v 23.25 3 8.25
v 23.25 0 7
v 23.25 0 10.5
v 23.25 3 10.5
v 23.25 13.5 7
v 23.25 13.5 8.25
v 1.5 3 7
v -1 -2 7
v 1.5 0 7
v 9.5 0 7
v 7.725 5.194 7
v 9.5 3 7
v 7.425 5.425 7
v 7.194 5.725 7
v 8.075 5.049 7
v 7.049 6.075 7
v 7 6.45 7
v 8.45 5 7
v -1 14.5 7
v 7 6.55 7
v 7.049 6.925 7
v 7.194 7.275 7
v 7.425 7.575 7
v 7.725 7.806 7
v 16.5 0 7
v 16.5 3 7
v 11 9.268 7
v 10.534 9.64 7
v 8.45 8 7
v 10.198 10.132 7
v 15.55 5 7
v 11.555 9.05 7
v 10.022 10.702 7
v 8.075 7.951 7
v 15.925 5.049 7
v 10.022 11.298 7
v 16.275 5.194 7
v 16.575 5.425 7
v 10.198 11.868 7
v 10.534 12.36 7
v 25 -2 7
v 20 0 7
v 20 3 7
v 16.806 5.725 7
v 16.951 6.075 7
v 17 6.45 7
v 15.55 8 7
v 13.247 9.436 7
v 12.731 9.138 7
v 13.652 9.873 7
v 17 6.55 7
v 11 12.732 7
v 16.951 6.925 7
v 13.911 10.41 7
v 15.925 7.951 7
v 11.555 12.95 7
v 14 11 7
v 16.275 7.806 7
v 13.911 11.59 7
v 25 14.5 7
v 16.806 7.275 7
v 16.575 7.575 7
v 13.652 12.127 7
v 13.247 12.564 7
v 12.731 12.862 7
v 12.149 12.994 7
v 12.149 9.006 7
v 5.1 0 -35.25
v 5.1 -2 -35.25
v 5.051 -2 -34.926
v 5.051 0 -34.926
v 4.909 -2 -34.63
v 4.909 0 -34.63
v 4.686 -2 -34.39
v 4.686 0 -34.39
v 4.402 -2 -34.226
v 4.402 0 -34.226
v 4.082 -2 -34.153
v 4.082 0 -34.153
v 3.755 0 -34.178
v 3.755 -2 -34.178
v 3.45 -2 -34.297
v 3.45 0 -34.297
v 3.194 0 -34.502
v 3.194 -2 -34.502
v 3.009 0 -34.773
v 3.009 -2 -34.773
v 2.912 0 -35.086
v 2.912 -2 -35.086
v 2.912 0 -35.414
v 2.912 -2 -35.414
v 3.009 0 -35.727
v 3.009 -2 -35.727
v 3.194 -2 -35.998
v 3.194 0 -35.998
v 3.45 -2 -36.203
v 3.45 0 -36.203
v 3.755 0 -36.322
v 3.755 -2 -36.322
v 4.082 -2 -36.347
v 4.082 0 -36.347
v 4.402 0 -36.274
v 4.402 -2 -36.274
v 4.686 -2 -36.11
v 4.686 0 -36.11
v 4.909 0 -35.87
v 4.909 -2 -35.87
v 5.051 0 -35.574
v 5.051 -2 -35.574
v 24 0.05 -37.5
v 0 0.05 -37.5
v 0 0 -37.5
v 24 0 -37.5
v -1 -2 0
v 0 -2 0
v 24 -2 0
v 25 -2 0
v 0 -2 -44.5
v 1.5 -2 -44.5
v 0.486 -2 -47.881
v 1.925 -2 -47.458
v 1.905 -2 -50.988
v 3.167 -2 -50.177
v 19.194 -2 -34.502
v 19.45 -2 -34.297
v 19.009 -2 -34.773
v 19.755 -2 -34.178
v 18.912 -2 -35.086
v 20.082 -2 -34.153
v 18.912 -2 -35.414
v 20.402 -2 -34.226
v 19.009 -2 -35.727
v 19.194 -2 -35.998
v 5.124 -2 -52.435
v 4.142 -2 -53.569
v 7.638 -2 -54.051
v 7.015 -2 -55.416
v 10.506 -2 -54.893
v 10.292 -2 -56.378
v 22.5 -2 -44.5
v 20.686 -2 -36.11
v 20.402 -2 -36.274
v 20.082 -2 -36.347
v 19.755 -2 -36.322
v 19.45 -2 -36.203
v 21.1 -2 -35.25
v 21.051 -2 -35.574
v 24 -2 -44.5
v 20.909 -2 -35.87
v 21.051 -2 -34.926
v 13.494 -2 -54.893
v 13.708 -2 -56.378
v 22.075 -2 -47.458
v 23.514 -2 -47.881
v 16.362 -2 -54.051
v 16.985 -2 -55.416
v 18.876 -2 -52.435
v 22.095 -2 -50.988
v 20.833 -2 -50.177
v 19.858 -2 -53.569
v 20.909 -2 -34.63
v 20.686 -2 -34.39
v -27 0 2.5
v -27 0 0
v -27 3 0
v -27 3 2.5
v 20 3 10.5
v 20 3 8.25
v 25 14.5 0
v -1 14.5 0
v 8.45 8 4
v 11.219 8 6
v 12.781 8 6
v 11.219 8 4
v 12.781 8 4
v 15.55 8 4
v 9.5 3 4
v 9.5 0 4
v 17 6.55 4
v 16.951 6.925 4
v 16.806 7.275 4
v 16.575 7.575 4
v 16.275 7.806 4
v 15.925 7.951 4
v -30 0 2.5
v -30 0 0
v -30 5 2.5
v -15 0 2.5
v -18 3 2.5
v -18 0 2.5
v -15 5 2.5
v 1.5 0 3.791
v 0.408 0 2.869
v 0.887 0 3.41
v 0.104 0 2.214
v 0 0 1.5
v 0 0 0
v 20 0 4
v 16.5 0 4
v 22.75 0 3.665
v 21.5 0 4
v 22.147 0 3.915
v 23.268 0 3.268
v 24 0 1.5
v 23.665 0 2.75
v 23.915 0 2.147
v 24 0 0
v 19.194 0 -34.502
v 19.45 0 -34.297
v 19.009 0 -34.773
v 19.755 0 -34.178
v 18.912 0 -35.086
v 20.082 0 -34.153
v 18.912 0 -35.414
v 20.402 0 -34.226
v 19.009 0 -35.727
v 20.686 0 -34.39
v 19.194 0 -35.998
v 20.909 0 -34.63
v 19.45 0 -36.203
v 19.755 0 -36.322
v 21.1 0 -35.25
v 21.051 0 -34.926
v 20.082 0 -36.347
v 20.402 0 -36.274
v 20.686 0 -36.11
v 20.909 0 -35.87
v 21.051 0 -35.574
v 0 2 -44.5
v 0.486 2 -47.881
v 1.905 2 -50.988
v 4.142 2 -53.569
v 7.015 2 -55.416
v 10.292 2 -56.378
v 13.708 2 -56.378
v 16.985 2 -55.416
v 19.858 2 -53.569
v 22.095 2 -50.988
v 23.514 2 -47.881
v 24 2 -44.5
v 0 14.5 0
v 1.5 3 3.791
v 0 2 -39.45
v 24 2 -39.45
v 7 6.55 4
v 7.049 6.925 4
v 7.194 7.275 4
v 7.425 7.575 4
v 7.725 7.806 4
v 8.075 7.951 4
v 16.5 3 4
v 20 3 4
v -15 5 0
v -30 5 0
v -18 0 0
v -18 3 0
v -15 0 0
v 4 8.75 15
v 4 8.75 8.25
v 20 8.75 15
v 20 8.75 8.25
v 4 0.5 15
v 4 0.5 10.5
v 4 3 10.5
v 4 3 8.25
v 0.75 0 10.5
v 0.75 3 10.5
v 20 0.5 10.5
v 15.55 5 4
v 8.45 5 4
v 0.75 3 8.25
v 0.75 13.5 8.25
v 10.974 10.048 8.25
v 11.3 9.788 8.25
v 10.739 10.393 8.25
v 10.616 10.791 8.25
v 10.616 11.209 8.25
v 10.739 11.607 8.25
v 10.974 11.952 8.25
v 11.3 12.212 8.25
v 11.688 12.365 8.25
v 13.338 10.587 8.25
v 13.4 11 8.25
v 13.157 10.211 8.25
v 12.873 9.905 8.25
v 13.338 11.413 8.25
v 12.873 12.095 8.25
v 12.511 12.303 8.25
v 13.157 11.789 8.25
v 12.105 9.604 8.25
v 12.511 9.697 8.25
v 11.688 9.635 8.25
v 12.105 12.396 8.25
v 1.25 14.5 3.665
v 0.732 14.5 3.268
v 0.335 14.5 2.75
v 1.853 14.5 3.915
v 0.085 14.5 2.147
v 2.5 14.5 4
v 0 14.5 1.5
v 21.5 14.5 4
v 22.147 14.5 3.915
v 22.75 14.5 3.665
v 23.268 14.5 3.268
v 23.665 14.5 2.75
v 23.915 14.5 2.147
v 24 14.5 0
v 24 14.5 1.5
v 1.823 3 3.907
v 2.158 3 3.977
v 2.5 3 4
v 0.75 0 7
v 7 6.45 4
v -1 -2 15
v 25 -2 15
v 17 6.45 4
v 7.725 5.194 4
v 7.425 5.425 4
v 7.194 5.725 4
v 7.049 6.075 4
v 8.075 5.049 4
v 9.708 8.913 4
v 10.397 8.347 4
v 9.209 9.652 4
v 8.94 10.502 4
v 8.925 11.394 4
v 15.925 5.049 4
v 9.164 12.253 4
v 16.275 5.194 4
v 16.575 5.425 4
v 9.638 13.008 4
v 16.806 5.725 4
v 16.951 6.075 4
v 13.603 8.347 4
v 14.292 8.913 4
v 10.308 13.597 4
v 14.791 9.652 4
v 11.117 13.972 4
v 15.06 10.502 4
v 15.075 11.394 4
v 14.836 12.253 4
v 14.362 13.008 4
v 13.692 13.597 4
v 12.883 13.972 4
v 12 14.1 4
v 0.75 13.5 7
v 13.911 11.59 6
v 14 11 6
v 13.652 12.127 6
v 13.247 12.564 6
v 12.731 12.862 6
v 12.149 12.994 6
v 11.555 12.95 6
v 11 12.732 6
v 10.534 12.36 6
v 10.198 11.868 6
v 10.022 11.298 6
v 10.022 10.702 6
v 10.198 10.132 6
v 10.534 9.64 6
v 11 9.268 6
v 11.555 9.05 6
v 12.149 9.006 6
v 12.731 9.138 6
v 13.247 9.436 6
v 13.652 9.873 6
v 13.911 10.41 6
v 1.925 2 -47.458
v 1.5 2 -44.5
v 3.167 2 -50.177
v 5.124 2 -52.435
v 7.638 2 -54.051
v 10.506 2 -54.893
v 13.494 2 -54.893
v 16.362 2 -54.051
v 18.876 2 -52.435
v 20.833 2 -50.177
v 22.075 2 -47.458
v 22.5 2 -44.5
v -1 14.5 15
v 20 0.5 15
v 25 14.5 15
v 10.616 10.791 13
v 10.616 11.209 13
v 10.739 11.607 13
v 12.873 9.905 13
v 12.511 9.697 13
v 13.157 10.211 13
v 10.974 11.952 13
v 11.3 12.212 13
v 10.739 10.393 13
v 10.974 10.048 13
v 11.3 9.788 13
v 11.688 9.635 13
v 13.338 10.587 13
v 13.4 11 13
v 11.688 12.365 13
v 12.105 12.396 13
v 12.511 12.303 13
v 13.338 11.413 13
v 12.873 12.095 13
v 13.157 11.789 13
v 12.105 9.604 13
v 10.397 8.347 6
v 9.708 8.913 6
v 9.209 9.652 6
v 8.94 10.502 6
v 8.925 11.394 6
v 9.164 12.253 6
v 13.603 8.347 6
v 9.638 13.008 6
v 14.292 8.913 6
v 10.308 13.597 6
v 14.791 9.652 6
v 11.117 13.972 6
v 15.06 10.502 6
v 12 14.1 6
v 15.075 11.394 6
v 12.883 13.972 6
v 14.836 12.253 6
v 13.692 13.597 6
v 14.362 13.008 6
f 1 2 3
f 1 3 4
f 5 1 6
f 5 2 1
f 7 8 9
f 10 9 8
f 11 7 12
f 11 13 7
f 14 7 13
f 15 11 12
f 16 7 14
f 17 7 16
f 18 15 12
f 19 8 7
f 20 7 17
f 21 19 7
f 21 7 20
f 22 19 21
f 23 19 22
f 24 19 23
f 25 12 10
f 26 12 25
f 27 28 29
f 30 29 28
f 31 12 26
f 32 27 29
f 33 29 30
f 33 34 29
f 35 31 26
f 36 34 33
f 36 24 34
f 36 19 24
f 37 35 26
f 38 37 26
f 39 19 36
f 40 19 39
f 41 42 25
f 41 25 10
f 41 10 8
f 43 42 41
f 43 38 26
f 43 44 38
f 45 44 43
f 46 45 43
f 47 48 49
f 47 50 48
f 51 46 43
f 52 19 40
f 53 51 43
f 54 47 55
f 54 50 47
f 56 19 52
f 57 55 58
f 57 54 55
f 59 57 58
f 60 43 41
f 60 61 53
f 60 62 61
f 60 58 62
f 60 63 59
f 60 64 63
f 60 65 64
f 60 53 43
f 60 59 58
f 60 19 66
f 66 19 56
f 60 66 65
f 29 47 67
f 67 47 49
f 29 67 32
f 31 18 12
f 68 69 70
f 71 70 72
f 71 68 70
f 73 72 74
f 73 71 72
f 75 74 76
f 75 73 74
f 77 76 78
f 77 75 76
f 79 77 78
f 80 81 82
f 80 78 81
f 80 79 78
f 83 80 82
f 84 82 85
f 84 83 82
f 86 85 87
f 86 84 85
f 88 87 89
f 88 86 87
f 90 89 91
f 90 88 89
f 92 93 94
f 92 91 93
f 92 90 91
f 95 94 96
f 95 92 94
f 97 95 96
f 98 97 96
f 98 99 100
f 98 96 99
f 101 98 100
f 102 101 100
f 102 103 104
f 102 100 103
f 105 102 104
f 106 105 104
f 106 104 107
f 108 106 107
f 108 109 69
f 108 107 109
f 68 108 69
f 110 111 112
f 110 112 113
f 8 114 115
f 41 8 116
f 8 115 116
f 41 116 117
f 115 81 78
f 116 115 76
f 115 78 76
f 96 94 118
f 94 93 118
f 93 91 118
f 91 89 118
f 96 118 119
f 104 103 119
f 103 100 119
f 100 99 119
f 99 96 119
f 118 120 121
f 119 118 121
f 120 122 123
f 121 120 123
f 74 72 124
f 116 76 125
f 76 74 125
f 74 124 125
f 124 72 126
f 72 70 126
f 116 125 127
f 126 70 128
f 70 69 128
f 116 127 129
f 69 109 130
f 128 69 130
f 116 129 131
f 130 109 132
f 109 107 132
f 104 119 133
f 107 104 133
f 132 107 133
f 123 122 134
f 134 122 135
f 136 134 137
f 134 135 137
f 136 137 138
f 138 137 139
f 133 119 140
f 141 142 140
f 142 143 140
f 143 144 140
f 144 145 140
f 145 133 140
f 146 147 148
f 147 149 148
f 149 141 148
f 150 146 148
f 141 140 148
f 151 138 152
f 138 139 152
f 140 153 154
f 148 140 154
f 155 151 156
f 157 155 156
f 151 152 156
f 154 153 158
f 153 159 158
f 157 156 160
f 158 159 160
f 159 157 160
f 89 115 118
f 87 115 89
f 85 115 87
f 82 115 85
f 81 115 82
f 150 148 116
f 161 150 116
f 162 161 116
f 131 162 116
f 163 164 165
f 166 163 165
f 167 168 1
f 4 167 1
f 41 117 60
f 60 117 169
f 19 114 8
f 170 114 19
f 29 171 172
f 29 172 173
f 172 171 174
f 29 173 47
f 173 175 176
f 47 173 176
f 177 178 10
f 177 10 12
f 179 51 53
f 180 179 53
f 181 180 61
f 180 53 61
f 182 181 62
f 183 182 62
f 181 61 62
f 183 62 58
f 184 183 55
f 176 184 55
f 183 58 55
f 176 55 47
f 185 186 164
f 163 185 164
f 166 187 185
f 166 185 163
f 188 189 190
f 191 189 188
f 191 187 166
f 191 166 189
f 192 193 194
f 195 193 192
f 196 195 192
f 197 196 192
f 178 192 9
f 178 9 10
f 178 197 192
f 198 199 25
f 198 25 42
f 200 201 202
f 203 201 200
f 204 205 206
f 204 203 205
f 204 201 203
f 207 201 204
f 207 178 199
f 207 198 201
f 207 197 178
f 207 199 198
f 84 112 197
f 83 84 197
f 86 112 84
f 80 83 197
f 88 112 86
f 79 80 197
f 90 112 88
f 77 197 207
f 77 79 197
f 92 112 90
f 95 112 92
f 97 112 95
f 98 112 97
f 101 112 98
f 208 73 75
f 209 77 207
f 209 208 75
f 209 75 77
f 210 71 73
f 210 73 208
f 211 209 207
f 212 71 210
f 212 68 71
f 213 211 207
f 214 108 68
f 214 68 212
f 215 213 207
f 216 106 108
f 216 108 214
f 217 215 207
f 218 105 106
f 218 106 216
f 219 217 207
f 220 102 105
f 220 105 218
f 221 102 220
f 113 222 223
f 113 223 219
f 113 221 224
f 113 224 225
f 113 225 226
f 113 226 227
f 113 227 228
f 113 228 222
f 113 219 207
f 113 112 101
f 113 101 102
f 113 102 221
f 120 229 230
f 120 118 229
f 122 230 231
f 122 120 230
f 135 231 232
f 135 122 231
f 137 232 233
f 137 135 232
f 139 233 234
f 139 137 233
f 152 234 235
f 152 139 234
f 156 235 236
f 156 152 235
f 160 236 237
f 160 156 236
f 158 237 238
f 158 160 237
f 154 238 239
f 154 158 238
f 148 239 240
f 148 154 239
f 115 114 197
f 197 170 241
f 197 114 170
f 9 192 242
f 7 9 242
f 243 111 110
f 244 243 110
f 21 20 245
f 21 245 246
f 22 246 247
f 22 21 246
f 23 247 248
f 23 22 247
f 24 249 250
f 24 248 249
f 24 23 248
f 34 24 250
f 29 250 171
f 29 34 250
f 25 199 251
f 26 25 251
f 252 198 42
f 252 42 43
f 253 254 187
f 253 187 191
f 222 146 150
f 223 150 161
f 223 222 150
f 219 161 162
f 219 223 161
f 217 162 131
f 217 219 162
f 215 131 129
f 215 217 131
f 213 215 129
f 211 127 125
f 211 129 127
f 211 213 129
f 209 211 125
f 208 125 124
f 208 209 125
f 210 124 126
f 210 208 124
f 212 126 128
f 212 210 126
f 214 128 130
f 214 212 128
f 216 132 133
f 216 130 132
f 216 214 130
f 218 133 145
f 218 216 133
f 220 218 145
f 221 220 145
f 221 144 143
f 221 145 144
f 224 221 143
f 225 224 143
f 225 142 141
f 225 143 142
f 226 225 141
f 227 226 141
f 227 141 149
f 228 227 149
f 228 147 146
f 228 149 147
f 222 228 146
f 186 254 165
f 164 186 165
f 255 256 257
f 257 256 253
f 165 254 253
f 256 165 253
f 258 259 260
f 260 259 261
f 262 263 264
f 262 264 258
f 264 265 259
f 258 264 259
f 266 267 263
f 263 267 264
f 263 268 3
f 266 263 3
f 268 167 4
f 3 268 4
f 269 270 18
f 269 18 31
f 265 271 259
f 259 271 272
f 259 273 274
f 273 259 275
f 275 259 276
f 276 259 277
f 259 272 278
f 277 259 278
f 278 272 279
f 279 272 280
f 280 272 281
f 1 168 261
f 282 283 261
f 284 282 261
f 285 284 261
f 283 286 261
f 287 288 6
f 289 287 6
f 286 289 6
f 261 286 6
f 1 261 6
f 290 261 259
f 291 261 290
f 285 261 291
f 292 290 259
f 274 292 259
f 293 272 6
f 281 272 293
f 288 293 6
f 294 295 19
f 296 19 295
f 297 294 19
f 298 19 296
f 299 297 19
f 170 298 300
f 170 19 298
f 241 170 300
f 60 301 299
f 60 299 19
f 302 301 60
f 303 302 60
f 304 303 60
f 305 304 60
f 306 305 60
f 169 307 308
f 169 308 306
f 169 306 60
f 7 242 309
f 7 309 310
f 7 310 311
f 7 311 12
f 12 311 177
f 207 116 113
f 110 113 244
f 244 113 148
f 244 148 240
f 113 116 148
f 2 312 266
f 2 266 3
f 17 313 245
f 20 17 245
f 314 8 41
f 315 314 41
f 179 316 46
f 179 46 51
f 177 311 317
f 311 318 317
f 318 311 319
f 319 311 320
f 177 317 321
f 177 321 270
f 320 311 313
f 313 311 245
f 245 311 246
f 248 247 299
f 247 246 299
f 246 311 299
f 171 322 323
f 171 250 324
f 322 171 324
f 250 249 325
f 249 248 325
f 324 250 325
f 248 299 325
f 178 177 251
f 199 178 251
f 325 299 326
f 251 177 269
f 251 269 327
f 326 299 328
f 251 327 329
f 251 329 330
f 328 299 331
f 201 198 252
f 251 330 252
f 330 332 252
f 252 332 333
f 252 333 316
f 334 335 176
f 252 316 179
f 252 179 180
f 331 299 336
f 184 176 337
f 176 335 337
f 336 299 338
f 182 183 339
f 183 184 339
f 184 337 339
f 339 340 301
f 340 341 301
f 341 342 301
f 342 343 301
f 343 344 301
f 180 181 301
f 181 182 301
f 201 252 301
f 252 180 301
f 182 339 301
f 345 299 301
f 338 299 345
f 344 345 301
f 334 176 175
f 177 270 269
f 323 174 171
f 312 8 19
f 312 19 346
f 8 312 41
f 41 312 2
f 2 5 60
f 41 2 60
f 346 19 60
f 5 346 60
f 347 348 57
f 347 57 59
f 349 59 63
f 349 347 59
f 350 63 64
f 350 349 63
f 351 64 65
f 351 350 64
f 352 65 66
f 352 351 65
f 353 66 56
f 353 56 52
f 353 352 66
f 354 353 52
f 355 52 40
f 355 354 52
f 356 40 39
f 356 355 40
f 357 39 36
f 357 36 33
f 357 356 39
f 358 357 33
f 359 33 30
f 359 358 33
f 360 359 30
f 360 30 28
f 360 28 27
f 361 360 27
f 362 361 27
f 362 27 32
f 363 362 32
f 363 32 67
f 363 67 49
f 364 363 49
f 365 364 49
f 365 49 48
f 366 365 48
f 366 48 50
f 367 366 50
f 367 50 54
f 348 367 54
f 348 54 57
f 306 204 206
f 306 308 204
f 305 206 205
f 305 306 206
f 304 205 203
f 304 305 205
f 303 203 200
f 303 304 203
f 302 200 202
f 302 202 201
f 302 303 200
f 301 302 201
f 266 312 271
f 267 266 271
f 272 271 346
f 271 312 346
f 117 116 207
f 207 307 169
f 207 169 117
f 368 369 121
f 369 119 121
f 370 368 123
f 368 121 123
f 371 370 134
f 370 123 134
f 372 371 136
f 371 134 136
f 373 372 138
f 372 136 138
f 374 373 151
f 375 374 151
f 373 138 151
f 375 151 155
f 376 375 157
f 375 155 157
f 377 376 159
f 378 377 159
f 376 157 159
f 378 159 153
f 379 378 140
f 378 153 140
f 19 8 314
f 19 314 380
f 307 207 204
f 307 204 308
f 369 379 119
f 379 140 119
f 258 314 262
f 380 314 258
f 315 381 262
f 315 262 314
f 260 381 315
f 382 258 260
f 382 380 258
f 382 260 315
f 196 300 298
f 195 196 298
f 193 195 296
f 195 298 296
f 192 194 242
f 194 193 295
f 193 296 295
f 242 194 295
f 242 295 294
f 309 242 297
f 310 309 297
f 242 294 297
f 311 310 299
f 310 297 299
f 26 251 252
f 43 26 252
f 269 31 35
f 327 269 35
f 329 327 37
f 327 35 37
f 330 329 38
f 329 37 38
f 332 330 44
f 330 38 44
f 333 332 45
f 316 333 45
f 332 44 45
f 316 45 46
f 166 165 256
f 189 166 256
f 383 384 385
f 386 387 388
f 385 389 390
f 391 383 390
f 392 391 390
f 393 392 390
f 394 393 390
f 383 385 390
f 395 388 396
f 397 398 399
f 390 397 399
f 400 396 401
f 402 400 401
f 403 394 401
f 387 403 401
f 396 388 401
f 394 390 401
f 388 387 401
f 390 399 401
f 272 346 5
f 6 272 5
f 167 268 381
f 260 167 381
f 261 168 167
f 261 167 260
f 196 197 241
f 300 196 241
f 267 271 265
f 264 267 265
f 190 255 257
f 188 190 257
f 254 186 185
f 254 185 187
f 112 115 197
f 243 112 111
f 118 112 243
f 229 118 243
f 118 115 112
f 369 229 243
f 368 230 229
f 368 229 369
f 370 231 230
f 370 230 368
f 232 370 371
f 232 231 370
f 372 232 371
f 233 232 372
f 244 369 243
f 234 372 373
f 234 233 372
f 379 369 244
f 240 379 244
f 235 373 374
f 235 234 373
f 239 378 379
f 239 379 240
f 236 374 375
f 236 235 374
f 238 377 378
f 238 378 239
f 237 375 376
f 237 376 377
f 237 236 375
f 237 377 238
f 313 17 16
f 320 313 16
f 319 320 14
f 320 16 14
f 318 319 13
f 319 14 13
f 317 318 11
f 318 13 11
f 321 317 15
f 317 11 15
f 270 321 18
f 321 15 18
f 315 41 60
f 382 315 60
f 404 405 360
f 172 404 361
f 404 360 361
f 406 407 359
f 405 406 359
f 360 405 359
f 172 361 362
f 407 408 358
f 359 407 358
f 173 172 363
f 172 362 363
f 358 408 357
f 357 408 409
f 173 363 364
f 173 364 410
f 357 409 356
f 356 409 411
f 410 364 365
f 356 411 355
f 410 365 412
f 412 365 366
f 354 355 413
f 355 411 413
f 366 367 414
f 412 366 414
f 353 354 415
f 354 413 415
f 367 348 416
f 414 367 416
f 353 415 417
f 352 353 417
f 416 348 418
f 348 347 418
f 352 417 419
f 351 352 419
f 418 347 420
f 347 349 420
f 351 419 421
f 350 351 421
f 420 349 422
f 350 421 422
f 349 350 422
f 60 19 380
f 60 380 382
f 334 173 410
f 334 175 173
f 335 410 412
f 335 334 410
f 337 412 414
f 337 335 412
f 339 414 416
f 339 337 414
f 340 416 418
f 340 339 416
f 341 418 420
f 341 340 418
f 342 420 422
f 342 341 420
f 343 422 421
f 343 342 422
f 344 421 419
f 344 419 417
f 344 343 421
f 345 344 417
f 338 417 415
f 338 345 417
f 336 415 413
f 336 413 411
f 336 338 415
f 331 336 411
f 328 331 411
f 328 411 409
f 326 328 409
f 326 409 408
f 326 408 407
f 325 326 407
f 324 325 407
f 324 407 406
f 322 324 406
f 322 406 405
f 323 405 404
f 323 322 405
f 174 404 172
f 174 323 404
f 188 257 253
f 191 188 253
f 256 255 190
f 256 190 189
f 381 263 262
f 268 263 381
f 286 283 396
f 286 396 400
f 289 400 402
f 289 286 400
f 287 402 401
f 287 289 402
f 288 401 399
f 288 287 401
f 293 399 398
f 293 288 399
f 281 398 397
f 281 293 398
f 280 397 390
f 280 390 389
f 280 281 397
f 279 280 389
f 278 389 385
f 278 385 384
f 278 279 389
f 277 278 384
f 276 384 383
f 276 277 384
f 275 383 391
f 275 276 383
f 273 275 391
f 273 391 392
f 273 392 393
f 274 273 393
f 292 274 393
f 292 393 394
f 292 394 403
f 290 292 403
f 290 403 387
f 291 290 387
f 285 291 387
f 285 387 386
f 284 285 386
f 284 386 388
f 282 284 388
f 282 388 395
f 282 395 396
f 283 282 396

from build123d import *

# Parameters (mm, degrees)
BOX014_W          = 9
BOX014_H          = 3
BOX014_DEPTH      = 2.5
BOX013_W          = 15
BOX013_H          = 5
BOX013_DEPTH      = 2.5
CYLINDER001_R     = 1.1
CYLINDER001_DEPTH = 10
CYLINDER002_R     = 1.1
CYLINDER002_DEPTH = 10
BOX007_W          = 24
BOX007_H          = 2
BOX007_DEPTH      = 43.5
CYLINDER009_W     = 10.5
CYLINDER009_H     = 4
CYLINDER009_ANGLE = 180
CYLINDER008_W     = 12
CYLINDER008_H     = 4
CYLINDER008_ANGLE = 180
BOX011_W          = 24
BOX011_H          = 4
BOX011_DEPTH      = 7
CYLINDER006_R     = 2
CYLINDER006_DEPTH = 2
CYLINDER005_R     = 3.1
CYLINDER005_DEPTH = 2
BOX002_W          = 8
BOX002_H          = 3
BOX002_DEPTH      = 7
BOX003_W          = 10
BOX003_H          = 3
BOX003_DEPTH      = 7
FILLET001_R       = 1.45
BOX015_W          = 3.5
BOX015_H          = 3
BOX015_DEPTH      = 7
BOX_W             = 24
BOX_H             = 14.5
BOX_DEPTH         = 4
FILLET_R          = 2.5
BOX001_W          = 26
BOX001_H          = 16.5
BOX001_DEPTH      = 7
CHAMFER_SIZE      = 1.95
BOX012_W          = 22.5
BOX012_H          = 10.5
BOX012_DEPTH      = 1.25
BOX017_W          = 16
BOX017_H          = 8.25
BOX017_DEPTH      = 10
BOX004_W          = 22.5
BOX004_H          = 3
BOX004_DEPTH      = 3.5
CYLINDER007_R     = 1.4
CYLINDER007_DEPTH = 6
BOX005_W          = 26
BOX005_H          = 16.5
BOX005_DEPTH      = 8


with BuildPart() as cube_dht22_support_inner:
    # Box014 → Box014 (new body)
    with BuildSketch(Plane(origin=(-27, 0, 0), x_dir=(1, 0, 0), z_dir=(0, 0, 1))):
        with Locations((4.5, 1.5)):
            Rectangle(BOX014_W, BOX014_H)
    extrude(amount=BOX014_DEPTH)


with BuildPart() as cut007_dht22_support:
    # Box013 → Box013 (new body)
    with BuildSketch(Plane(origin=(-30, 0, 0), x_dir=(1, 0, 0), z_dir=(0, 0, 1))):
        with Locations((7.5, 2.5)):
            Rectangle(BOX013_W, BOX013_H)
    extrude(amount=BOX013_DEPTH)

    # Cut007: cut Cube(dht22_support_inner)
    add(cube_dht22_support_inner.part, mode=Mode.SUBTRACT)


with BuildPart() as cylinder001_right_bolt_clear:
    # Cylinder001 → Cylinder001 (new body)
    with BuildSketch(Plane(origin=(4, 0, -35.25), x_dir=(1, 0, 0), z_dir=(0, -1, 0))):
        Circle(CYLINDER001_R)
    extrude(amount=CYLINDER001_DEPTH)


with BuildPart() as fusion004:
    # Cylinder002 → Cylinder002 (new body)
    with BuildSketch(Plane(origin=(20, 0, -35.25), x_dir=(1, 0, 0), z_dir=(0, -1, 0))):
        Circle(CYLINDER002_R)
    extrude(amount=CYLINDER002_DEPTH)

    # Fusion004: union Cylinder001(right_bolt_clear)
    add(cylinder001_right_bolt_clear.part)


with BuildPart() as cut005:
    # Box007 → Box007 (new body)
    with BuildSketch(Plane(origin=(0, -2, -37.5), x_dir=(1, 0, 0), z_dir=(0, 0, 1))):
        with Locations((12, 1)):
            Rectangle(BOX007_W, BOX007_H)
    extrude(amount=BOX007_DEPTH)

    # Cut005: cut Fusion004
    add(fusion004.part, mode=Mode.SUBTRACT)


with BuildPart() as cylinder008_inner_hook:
    # Cylinder009 → Cylinder009 (revolve)
    with BuildSketch(Plane(origin=(12, 2, -44.5), x_dir=(-1, 0, 0), z_dir=(0, 0, 1))):
        with Locations((5.25, 2)):
            Rectangle(CYLINDER009_W, CYLINDER009_H)
    revolve(axis=Axis((12, 2, -44.5), (0, -1, 0)), revolution_arc=CYLINDER009_ANGLE)


with BuildPart() as cylinder008_outer_hook:
    # Cylinder008 → Cylinder008 (revolve)
    with BuildSketch(Plane(origin=(12, 2, -44.5), x_dir=(-1, 0, 0), z_dir=(0, 0, 1))):
        with Locations((6, 2)):
            Rectangle(CYLINDER008_W, CYLINDER008_H)
    revolve(axis=Axis((12, 2, -44.5), (0, -1, 0)), revolution_arc=CYLINDER008_ANGLE)


with BuildPart() as cut004:
    # Box011 → Box011 (new body)
    with BuildSketch(Plane(origin=(0, -2, -44.5), x_dir=(1, 0, 0), z_dir=(0, 0, 1))):
        with Locations((12, 2)):
            Rectangle(BOX011_W, BOX011_H)
    extrude(amount=BOX011_DEPTH)

    # Fusion008: union Cylinder008(outer_hook)
    add(cylinder008_outer_hook.part)

    # Cut004: cut Cylinder008(inner_hook)
    add(cylinder008_inner_hook.part, mode=Mode.SUBTRACT)


with BuildPart() as cylinder005_bolt_clear:
    # Cylinder006 → Cylinder006 (new body)
    with BuildSketch(Plane(origin=(12, 11, 5), x_dir=(1, 0, 0), z_dir=(0, 0, 1))):
        Circle(CYLINDER006_R)
    extrude(amount=CYLINDER006_DEPTH)


with BuildPart() as cylinder005_bolt_head:
    # Cylinder005 → Cylinder005 (new body)
    with BuildSketch(Plane(origin=(12, 11, 4), x_dir=(1, 0, 0), z_dir=(0, 0, 1))):
        Circle(CYLINDER005_R)
    extrude(amount=CYLINDER005_DEPTH)


with BuildPart() as cube_header_cutter_big:
    # Box002 → Box002 (new body)
    with BuildSketch(Plane(origin=(1.5, 0, 0), x_dir=(1, 0, 0), z_dir=(0, 0, 1))):
        with Locations((4, 1.5)):
            Rectangle(BOX002_W, BOX002_H)
    extrude(amount=BOX002_DEPTH)


with BuildPart() as fillet001:
    # Box003 → Box003 (new body)
    with BuildSketch(Plane(origin=(7, 5, 0), x_dir=(1, 0, 0), z_dir=(0, 0, 1))):
        with Locations((5, 1.5)):
            Rectangle(BOX003_W, BOX003_H)
    extrude(amount=BOX003_DEPTH)

    # Fillet001
    fillet001_edges = [fillet001.edges().sort_by_distance(p)[0] for p in [
        (7, 5, 3.5),
        (7, 8, 3.5),
        (17, 5, 3.5),
        (17, 8, 3.5),
    ]]
    fillet(fillet001_edges, radius=FILLET001_R)


with BuildPart() as fusion:
    # Box015 → Box015 (new body)
    with BuildSketch(Plane(origin=(16.5, 0, 0), x_dir=(1, 0, 0), z_dir=(0, 0, 1))):
        with Locations((1.75, 1.5)):
            Rectangle(BOX015_W, BOX015_H)
    extrude(amount=BOX015_DEPTH)

    # Fusion: union Cylinder005(bolt_clear), Cylinder005(bolt_head), Cube(header_cutter_big), Fillet001
    add(cylinder005_bolt_clear.part)
    add(cylinder005_bolt_head.part)
    add(cube_header_cutter_big.part)
    add(fillet001.part)


with BuildPart() as fillet_body:
    # Box → Box (new body)
    with BuildSketch(Plane.XY):
        with Locations((12, 7.25)):
            Rectangle(BOX_W, BOX_H)
    extrude(amount=BOX_DEPTH)

    # Fillet
    fillet_edges = [fillet_body.edges().sort_by_distance(p)[0] for p in [
        (0, 7.25, 4),
        (24, 7.25, 4),
    ]]
    fillet(fillet_edges, radius=FILLET_R)


with BuildPart() as chamfer_base:
    # Box001 → Box001 (new body)
    with BuildSketch(Plane(origin=(-1, -2, 0), x_dir=(1, 0, 0), z_dir=(0, 0, 1))):
        with Locations((13, 8.25)):
            Rectangle(BOX001_W, BOX001_H)
    extrude(amount=BOX001_DEPTH)

    # Cut: cut Fillet body
    add(fillet_body.part, mode=Mode.SUBTRACT)

    # Cut008: cut Fusion
    add(fusion.part, mode=Mode.SUBTRACT)

    # Fusion009: union Cut005, Cut004
    add(cut005.part)
    add(cut004.part)

    # Chamfer
    chamfer_edges = [chamfer_base.edges().sort_by_distance(p)[0] for p in [
        (12, 2, -37.5),
    ]]
    chamfer(chamfer_edges, length=CHAMFER_SIZE)


with BuildPart() as box012:
    # Box012 → Box012 (new body)
    with BuildSketch(Plane(origin=(0.75, 3, 7), x_dir=(1, 0, 0), z_dir=(0, 0, 1))):
        with Locations((11.25, 5.25)):
            Rectangle(BOX012_W, BOX012_H)
    extrude(amount=BOX012_DEPTH)


with BuildPart() as cube_dht22:
    # Box017 → Box017 (new body)
    with BuildSketch(Plane(origin=(4, 0.5, 7), x_dir=(1, 0, 0), z_dir=(0, 0, 1))):
        with Locations((8, 4.125)):
            Rectangle(BOX017_W, BOX017_H)
    extrude(amount=BOX017_DEPTH)


with BuildPart() as cube_pcb_cut:
    # Box004 → Box004 (new body)
    with BuildSketch(Plane(origin=(0.75, 0, 7), x_dir=(1, 0, 0), z_dir=(0, 0, 1))):
        with Locations((11.25, 1.5)):
            Rectangle(BOX004_W, BOX004_H)
    extrude(amount=BOX004_DEPTH)


with BuildPart() as fusion010:
    # Cylinder007 → Cylinder007 (new body)
    with BuildSketch(Plane(origin=(12, 11, 7), x_dir=(1, 0, 0), z_dir=(0, 0, 1))):
        Circle(CYLINDER007_R)
    extrude(amount=CYLINDER007_DEPTH)

    # Fusion010: union Box012, Cube(dht22), Cube(pcb_cut)
    add(box012.part)
    add(cube_dht22.part)
    add(cube_pcb_cut.part)


with BuildPart() as cut009_cover:
    # Box005 → Box005 (new body)
    with BuildSketch(Plane(origin=(-1, -2, 7), x_dir=(1, 0, 0), z_dir=(0, 0, 1))):
        with Locations((13, 8.25)):
            Rectangle(BOX005_W, BOX005_H)
    extrude(amount=BOX005_DEPTH)

    # Cut009: cut Fusion010
    add(fusion010.part, mode=Mode.SUBTRACT)


solid = Compound([cut007_dht22_support.part, chamfer_base.part, cut009_cover.part])
